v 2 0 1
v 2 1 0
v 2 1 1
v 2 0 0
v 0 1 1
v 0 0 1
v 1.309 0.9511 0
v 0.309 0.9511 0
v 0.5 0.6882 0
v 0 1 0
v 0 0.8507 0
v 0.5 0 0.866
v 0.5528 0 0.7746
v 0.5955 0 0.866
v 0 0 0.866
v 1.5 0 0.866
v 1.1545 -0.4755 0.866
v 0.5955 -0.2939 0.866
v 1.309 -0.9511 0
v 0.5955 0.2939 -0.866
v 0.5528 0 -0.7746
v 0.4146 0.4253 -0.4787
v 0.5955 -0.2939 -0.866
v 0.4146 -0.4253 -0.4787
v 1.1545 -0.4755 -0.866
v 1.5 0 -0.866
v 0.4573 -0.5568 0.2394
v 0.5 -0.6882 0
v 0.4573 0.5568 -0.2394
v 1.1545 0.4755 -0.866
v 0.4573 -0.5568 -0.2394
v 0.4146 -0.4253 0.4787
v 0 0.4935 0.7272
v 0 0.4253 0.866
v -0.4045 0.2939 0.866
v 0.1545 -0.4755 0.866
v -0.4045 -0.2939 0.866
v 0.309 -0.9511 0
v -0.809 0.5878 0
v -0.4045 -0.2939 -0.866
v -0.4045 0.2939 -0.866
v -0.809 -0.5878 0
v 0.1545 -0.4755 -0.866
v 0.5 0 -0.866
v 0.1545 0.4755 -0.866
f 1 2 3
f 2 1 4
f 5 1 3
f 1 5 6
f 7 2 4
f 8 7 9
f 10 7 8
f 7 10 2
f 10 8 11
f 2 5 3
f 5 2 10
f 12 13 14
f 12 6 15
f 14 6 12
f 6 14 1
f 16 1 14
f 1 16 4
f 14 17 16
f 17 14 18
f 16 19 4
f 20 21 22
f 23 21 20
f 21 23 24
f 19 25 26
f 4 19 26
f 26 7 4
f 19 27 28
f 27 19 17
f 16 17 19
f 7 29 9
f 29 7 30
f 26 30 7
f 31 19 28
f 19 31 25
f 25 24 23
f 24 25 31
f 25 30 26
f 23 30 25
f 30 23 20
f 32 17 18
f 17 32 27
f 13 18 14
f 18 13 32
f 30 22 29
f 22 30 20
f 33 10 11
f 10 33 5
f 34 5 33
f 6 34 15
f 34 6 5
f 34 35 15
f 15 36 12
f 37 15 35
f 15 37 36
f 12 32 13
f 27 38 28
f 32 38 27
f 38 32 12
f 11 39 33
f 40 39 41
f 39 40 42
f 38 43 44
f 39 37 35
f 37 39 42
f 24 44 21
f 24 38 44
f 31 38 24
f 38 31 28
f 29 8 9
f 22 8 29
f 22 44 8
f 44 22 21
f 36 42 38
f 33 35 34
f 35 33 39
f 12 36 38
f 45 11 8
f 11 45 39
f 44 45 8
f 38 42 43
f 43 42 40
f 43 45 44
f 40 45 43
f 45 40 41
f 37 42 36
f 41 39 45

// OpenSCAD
group() { cube(); }
{ cube(); sphere(); }
translate([1, 0, 0]) { { cube(); sphere(); } }
union() { { cube(); } { sphere(); } }
module m() { { cube(); } }
m();
